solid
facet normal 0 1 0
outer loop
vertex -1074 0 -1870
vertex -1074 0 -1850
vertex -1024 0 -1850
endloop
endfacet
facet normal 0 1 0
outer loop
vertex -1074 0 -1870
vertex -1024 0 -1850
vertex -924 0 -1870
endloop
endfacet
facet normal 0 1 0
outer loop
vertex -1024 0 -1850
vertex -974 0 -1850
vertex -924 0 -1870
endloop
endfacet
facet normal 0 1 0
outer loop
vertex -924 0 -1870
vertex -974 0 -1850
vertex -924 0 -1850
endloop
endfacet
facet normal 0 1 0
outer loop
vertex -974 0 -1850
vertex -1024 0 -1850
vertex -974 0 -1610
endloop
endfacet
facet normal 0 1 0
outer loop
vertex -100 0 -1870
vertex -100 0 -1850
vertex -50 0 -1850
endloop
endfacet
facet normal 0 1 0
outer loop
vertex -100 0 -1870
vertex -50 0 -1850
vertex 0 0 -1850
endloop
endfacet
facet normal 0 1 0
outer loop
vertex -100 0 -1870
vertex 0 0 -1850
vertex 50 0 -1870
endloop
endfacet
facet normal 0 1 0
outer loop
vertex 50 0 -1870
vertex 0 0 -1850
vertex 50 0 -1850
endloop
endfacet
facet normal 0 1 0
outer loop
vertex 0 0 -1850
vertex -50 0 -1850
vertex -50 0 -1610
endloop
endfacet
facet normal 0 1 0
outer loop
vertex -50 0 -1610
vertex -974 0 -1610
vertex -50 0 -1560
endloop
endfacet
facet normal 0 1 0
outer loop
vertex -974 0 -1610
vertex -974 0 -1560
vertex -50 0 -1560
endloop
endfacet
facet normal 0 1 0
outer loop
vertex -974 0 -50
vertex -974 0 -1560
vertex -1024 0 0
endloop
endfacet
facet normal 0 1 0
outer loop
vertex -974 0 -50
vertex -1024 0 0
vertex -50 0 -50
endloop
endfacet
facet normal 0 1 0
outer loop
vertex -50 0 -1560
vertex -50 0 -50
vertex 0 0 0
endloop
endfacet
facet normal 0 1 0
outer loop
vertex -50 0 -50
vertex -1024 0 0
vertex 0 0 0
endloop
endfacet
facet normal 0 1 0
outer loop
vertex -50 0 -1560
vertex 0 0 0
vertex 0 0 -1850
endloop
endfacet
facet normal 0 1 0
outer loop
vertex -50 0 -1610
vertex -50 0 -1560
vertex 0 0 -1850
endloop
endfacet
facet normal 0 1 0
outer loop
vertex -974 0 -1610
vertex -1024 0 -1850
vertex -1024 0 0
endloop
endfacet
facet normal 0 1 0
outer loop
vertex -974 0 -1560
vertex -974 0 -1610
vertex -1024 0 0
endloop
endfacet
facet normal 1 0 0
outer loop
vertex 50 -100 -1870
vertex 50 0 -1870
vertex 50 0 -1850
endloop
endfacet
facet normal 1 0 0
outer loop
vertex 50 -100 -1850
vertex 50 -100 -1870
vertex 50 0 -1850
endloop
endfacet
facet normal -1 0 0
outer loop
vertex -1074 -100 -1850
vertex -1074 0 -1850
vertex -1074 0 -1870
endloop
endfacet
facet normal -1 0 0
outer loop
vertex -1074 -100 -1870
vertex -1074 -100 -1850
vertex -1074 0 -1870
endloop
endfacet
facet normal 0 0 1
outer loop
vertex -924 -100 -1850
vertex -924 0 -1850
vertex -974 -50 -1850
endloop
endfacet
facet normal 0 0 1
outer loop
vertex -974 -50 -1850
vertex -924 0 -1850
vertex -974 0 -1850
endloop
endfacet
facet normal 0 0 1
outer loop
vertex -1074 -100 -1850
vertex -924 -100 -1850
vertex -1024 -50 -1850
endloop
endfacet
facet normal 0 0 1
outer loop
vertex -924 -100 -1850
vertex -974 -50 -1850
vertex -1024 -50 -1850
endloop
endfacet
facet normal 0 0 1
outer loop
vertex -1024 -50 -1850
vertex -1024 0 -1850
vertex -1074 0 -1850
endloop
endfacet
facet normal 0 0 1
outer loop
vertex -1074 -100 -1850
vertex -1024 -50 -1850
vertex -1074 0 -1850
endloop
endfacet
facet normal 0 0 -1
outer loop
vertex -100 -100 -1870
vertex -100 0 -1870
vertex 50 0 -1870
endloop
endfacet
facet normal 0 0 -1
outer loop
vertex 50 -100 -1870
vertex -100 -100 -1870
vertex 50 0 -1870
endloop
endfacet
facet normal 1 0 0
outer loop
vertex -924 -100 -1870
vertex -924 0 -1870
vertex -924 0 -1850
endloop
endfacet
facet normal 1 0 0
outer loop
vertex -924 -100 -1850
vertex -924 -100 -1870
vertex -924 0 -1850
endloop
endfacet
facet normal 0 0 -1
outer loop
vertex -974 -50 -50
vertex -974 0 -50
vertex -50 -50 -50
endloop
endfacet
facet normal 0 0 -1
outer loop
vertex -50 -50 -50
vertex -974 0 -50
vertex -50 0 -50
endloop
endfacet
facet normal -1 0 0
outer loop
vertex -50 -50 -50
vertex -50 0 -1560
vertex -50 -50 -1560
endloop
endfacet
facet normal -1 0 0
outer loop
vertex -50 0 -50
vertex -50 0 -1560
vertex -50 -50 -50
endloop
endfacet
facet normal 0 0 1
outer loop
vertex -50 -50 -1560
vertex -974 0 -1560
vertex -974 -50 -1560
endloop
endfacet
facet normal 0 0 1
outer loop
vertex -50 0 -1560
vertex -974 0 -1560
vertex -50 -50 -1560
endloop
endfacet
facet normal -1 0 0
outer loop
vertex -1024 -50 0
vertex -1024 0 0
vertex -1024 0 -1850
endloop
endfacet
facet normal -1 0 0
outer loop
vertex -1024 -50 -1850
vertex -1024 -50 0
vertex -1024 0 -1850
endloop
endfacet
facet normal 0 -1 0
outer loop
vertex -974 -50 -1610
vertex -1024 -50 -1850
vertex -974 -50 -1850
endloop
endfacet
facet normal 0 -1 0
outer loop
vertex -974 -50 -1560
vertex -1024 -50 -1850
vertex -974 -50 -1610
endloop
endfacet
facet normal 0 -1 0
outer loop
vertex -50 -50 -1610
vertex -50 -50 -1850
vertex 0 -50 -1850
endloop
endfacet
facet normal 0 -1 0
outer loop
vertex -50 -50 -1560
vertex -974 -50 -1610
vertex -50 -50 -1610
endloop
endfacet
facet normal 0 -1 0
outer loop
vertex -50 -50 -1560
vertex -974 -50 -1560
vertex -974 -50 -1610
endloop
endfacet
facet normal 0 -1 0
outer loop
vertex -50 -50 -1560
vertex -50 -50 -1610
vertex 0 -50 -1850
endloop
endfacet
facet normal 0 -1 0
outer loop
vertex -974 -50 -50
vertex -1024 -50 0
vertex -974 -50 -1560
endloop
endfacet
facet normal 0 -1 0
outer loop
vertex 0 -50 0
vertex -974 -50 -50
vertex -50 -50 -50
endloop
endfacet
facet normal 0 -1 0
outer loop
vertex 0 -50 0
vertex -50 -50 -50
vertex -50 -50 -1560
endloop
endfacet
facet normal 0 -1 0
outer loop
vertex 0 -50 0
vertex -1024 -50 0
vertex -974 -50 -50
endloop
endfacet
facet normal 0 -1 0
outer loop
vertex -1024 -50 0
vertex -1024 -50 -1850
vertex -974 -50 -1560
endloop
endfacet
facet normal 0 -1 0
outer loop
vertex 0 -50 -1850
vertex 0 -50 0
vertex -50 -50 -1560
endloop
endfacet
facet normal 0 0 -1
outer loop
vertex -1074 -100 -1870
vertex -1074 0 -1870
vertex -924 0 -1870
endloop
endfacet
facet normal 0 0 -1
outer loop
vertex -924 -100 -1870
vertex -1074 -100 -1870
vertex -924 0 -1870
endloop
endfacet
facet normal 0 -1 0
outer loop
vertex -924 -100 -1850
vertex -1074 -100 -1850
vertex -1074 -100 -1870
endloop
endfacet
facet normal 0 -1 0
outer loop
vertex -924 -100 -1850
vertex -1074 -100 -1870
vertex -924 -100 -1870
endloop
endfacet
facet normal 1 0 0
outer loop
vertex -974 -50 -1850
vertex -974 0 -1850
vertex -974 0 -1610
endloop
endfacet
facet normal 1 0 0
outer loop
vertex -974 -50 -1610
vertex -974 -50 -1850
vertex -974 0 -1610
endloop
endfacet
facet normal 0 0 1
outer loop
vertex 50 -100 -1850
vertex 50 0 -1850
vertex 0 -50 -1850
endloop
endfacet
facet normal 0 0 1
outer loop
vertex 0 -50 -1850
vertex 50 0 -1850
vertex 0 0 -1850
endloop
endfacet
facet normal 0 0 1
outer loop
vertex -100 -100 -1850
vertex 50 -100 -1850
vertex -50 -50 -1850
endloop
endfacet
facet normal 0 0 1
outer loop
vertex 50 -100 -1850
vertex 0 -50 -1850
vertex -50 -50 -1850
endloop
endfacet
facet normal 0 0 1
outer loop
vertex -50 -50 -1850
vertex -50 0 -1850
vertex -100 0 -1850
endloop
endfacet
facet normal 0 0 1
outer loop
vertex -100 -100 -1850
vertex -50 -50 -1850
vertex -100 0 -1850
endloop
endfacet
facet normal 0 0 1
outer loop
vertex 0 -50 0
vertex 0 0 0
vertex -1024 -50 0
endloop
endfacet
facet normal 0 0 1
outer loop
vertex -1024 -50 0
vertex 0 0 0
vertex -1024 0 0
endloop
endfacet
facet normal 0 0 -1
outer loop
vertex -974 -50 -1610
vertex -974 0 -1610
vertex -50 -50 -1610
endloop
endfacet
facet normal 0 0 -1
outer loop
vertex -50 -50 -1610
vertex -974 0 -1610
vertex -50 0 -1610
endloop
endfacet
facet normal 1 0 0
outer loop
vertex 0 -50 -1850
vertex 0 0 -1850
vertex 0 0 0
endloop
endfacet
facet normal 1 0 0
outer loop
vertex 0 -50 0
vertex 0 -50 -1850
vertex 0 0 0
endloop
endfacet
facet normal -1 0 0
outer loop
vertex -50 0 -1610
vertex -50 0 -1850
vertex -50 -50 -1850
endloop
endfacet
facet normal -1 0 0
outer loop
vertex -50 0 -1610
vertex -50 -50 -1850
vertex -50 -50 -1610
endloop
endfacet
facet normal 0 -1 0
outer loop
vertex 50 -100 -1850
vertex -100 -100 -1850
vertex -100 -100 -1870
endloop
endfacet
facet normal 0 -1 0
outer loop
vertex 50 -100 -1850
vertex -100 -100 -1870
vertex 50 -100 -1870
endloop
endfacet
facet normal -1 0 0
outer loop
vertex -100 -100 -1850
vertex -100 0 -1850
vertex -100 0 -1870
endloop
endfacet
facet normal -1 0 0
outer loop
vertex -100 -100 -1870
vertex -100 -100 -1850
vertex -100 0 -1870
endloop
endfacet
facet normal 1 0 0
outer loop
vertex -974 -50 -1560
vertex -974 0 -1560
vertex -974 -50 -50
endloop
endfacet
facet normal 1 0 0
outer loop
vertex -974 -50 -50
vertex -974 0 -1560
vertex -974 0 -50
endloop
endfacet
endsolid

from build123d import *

# Parameters (mm, degrees)
F0_W     = 924
F0_H     = 1510
F0_W_2   = 50
F0_H_2   = 240
F1_DEPTH = 50
F2_DEPTH = 100
F3_DEPTH = 100


with BuildPart() as f1:
    # F0 (on Front) → F1 (new body)
    with BuildSketch(Plane.XZ):
        Polygon((0, 0), (-1024, 0), (-1024, -1610), (-974, -1610), (-50, -1610), (0, -1610), align=None)
        with Locations((-512, -805)):
            Rectangle(F0_W, F0_H, mode=Mode.SUBTRACT)
        with Locations((-999, -1730)):
            Rectangle(F0_W_2, F0_H_2)
        with Locations((-25, -1730)):
            Rectangle(F0_W_2, F0_H_2)
    extrude(amount=F1_DEPTH)

    # F0 (on Front) → F2 (join)
    with BuildSketch(Plane.XZ):
        Polygon((-974, -1850), (-1024, -1850), (-1074, -1850), (-1074, -1870), (-924, -1870), (-924, -1850), align=None)
    extrude(amount=F2_DEPTH)

    # F0 (on Front) → F3 (join)
    with BuildSketch(Plane.XZ):
        Polygon((50, -1850), (0, -1850), (-50, -1850), (-100, -1850), (-100, -1870), (50, -1870), align=None)
    extrude(amount=F3_DEPTH)


solid = f1.part
